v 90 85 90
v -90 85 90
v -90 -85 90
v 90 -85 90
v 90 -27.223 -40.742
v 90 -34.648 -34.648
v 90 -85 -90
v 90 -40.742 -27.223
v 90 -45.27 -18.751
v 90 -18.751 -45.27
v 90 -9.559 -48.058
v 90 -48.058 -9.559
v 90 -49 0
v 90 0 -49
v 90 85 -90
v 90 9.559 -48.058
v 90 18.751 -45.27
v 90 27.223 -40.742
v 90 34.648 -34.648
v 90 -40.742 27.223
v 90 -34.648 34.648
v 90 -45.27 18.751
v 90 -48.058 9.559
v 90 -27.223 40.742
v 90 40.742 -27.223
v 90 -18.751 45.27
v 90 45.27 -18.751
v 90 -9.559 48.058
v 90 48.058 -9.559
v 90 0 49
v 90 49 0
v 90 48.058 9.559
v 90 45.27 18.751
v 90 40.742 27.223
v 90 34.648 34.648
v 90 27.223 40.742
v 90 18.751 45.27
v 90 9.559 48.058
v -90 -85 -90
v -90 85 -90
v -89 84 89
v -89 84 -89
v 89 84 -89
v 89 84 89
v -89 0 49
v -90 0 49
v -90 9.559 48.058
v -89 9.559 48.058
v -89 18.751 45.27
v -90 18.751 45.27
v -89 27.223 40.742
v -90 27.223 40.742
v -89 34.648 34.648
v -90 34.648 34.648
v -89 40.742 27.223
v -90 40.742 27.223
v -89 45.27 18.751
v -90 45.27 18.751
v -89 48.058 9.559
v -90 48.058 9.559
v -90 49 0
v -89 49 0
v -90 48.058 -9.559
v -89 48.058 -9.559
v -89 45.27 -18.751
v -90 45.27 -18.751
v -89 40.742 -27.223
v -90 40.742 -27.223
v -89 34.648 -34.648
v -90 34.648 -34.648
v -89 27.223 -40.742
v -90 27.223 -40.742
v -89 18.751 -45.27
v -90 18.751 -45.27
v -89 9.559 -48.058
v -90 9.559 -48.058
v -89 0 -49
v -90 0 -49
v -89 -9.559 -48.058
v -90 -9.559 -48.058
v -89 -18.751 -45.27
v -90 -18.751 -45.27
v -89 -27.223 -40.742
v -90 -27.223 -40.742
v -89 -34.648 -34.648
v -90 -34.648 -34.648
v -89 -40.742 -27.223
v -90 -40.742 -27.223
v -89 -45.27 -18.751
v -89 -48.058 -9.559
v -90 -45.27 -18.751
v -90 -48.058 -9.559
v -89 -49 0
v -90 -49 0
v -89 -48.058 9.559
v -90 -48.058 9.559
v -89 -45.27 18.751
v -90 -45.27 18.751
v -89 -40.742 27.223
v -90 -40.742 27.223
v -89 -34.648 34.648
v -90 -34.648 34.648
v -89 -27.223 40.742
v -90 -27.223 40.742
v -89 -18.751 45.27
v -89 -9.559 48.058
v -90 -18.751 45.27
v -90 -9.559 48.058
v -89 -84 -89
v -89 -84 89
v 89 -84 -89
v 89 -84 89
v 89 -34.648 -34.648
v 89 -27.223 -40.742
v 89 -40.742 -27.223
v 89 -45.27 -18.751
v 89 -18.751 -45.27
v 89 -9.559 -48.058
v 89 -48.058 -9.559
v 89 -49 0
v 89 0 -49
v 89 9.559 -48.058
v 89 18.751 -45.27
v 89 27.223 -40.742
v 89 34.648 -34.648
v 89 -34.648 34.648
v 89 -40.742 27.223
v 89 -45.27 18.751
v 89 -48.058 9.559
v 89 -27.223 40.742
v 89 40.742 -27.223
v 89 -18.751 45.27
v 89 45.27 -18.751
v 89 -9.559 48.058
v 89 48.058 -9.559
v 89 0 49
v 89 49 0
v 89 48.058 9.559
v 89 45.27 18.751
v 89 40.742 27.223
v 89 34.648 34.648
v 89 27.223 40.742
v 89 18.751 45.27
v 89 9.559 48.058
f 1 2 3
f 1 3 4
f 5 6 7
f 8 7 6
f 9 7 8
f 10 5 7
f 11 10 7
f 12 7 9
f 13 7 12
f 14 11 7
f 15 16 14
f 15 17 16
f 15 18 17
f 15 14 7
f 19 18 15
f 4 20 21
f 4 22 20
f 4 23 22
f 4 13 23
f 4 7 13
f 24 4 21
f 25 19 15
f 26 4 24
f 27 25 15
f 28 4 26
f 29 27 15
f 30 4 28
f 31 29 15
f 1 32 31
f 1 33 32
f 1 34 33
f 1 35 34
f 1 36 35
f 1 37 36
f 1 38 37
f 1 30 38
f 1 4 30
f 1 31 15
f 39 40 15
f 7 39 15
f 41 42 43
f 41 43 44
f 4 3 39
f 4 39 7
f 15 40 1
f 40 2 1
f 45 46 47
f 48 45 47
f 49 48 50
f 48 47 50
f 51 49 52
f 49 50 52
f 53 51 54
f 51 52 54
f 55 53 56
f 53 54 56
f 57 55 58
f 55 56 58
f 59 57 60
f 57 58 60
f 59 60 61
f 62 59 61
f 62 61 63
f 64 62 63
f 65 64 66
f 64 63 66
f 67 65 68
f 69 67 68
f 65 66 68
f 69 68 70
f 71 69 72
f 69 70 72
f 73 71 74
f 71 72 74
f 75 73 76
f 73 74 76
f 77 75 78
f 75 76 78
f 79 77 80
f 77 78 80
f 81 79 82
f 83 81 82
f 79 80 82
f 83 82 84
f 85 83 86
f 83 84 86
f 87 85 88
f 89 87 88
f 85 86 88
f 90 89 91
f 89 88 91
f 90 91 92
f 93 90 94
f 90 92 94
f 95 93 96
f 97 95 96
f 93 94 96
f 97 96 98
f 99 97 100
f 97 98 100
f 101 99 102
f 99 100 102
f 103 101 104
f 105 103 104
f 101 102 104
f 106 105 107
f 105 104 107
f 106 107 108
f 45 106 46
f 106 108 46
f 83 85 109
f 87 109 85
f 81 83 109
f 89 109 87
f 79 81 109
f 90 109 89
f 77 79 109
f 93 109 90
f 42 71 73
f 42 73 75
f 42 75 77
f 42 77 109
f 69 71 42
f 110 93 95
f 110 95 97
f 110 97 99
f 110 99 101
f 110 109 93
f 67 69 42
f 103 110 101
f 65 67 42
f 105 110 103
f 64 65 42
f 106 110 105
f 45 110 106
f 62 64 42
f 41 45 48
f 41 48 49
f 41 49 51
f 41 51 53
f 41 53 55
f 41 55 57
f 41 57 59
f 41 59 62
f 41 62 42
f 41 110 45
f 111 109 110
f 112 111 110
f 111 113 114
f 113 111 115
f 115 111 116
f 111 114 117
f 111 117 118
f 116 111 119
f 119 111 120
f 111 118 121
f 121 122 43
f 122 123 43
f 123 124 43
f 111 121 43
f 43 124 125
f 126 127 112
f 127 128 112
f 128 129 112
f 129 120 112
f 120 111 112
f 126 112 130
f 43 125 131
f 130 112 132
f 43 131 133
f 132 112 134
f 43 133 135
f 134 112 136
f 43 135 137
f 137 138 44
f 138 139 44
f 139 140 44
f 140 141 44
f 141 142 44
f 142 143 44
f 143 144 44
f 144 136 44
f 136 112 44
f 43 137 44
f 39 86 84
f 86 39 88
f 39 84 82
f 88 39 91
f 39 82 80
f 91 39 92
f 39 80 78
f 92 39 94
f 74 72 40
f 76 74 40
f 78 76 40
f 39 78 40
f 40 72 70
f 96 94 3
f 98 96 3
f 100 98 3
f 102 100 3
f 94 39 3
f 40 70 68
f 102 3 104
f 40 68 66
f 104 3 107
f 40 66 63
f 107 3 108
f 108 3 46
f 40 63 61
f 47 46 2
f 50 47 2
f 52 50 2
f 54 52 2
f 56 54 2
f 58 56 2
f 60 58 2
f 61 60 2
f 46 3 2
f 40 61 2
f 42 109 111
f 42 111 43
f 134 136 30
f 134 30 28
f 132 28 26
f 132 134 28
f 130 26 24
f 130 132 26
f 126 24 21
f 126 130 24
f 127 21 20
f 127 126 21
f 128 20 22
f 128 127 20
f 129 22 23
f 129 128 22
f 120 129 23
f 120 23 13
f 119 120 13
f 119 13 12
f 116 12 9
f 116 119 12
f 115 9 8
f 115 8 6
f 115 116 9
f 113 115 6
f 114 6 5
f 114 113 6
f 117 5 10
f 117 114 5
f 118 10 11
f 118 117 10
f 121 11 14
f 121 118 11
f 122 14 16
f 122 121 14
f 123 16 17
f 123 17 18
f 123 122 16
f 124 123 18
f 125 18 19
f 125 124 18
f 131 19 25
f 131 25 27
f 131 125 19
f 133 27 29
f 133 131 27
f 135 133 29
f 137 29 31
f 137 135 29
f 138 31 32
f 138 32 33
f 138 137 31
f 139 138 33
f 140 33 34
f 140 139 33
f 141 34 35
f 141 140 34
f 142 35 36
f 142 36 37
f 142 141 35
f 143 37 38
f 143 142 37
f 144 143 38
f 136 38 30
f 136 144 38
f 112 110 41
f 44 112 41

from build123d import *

# Parameters (mm, degrees)
CROQUIS1_W              = 180
CROQUIS1_H              = 170
SALIENTE_EXTRUIR1_DEPTH = 90
CROQUIS2_R              = 49
CORTAR_EXTRUIR1_DEPTH   = 1
CORTAR_EXTRUIR2_START   = -1
CROQUIS3_R              = 49
CORTAR_EXTRUIR2_DEPTH   = 1
VACIADO1_START          = -89
VACIADO1_OUTLINE_W      = 168
VACIADO1_OUTLINE_H      = 178
VACIADO1_DEPTH          = 178


# Read off the part's stored shape, not the designer's step: Vaciado1
with BuildPart() as part:
    # Croquis1 → Saliente-Extruir1 (new, symmetric)
    with BuildSketch(Plane.XY):
        Rectangle(CROQUIS1_W, CROQUIS1_H)
    extrude(amount=SALIENTE_EXTRUIR1_DEPTH, both=True)

    # Croquis2 → Cortar-Extruir1 (cut)
    with BuildSketch(Plane.ZY.offset(90)):
        Circle(CROQUIS2_R)
    extrude(amount=-CORTAR_EXTRUIR1_DEPTH, mode=Mode.SUBTRACT)

    # Croquis3 → Cortar-Extruir2 (cut)
    with BuildSketch(Plane(origin=(90, 0, 0), x_dir=(0, 0, -1), z_dir=(1, 0, 0)).offset(CORTAR_EXTRUIR2_START)):
        with Locations(Location((0, 0, 0), (0, 0, 180))):
            Circle(CROQUIS3_R)
    extrude(amount=CORTAR_EXTRUIR2_DEPTH, mode=Mode.SUBTRACT)

    # Vaciado1 outline → Vaciado1 (cut)
    with BuildSketch(Plane.YZ.offset(VACIADO1_START)):
        Rectangle(VACIADO1_OUTLINE_W, VACIADO1_OUTLINE_H)
    extrude(amount=VACIADO1_DEPTH, mode=Mode.SUBTRACT)


solid = part.part
